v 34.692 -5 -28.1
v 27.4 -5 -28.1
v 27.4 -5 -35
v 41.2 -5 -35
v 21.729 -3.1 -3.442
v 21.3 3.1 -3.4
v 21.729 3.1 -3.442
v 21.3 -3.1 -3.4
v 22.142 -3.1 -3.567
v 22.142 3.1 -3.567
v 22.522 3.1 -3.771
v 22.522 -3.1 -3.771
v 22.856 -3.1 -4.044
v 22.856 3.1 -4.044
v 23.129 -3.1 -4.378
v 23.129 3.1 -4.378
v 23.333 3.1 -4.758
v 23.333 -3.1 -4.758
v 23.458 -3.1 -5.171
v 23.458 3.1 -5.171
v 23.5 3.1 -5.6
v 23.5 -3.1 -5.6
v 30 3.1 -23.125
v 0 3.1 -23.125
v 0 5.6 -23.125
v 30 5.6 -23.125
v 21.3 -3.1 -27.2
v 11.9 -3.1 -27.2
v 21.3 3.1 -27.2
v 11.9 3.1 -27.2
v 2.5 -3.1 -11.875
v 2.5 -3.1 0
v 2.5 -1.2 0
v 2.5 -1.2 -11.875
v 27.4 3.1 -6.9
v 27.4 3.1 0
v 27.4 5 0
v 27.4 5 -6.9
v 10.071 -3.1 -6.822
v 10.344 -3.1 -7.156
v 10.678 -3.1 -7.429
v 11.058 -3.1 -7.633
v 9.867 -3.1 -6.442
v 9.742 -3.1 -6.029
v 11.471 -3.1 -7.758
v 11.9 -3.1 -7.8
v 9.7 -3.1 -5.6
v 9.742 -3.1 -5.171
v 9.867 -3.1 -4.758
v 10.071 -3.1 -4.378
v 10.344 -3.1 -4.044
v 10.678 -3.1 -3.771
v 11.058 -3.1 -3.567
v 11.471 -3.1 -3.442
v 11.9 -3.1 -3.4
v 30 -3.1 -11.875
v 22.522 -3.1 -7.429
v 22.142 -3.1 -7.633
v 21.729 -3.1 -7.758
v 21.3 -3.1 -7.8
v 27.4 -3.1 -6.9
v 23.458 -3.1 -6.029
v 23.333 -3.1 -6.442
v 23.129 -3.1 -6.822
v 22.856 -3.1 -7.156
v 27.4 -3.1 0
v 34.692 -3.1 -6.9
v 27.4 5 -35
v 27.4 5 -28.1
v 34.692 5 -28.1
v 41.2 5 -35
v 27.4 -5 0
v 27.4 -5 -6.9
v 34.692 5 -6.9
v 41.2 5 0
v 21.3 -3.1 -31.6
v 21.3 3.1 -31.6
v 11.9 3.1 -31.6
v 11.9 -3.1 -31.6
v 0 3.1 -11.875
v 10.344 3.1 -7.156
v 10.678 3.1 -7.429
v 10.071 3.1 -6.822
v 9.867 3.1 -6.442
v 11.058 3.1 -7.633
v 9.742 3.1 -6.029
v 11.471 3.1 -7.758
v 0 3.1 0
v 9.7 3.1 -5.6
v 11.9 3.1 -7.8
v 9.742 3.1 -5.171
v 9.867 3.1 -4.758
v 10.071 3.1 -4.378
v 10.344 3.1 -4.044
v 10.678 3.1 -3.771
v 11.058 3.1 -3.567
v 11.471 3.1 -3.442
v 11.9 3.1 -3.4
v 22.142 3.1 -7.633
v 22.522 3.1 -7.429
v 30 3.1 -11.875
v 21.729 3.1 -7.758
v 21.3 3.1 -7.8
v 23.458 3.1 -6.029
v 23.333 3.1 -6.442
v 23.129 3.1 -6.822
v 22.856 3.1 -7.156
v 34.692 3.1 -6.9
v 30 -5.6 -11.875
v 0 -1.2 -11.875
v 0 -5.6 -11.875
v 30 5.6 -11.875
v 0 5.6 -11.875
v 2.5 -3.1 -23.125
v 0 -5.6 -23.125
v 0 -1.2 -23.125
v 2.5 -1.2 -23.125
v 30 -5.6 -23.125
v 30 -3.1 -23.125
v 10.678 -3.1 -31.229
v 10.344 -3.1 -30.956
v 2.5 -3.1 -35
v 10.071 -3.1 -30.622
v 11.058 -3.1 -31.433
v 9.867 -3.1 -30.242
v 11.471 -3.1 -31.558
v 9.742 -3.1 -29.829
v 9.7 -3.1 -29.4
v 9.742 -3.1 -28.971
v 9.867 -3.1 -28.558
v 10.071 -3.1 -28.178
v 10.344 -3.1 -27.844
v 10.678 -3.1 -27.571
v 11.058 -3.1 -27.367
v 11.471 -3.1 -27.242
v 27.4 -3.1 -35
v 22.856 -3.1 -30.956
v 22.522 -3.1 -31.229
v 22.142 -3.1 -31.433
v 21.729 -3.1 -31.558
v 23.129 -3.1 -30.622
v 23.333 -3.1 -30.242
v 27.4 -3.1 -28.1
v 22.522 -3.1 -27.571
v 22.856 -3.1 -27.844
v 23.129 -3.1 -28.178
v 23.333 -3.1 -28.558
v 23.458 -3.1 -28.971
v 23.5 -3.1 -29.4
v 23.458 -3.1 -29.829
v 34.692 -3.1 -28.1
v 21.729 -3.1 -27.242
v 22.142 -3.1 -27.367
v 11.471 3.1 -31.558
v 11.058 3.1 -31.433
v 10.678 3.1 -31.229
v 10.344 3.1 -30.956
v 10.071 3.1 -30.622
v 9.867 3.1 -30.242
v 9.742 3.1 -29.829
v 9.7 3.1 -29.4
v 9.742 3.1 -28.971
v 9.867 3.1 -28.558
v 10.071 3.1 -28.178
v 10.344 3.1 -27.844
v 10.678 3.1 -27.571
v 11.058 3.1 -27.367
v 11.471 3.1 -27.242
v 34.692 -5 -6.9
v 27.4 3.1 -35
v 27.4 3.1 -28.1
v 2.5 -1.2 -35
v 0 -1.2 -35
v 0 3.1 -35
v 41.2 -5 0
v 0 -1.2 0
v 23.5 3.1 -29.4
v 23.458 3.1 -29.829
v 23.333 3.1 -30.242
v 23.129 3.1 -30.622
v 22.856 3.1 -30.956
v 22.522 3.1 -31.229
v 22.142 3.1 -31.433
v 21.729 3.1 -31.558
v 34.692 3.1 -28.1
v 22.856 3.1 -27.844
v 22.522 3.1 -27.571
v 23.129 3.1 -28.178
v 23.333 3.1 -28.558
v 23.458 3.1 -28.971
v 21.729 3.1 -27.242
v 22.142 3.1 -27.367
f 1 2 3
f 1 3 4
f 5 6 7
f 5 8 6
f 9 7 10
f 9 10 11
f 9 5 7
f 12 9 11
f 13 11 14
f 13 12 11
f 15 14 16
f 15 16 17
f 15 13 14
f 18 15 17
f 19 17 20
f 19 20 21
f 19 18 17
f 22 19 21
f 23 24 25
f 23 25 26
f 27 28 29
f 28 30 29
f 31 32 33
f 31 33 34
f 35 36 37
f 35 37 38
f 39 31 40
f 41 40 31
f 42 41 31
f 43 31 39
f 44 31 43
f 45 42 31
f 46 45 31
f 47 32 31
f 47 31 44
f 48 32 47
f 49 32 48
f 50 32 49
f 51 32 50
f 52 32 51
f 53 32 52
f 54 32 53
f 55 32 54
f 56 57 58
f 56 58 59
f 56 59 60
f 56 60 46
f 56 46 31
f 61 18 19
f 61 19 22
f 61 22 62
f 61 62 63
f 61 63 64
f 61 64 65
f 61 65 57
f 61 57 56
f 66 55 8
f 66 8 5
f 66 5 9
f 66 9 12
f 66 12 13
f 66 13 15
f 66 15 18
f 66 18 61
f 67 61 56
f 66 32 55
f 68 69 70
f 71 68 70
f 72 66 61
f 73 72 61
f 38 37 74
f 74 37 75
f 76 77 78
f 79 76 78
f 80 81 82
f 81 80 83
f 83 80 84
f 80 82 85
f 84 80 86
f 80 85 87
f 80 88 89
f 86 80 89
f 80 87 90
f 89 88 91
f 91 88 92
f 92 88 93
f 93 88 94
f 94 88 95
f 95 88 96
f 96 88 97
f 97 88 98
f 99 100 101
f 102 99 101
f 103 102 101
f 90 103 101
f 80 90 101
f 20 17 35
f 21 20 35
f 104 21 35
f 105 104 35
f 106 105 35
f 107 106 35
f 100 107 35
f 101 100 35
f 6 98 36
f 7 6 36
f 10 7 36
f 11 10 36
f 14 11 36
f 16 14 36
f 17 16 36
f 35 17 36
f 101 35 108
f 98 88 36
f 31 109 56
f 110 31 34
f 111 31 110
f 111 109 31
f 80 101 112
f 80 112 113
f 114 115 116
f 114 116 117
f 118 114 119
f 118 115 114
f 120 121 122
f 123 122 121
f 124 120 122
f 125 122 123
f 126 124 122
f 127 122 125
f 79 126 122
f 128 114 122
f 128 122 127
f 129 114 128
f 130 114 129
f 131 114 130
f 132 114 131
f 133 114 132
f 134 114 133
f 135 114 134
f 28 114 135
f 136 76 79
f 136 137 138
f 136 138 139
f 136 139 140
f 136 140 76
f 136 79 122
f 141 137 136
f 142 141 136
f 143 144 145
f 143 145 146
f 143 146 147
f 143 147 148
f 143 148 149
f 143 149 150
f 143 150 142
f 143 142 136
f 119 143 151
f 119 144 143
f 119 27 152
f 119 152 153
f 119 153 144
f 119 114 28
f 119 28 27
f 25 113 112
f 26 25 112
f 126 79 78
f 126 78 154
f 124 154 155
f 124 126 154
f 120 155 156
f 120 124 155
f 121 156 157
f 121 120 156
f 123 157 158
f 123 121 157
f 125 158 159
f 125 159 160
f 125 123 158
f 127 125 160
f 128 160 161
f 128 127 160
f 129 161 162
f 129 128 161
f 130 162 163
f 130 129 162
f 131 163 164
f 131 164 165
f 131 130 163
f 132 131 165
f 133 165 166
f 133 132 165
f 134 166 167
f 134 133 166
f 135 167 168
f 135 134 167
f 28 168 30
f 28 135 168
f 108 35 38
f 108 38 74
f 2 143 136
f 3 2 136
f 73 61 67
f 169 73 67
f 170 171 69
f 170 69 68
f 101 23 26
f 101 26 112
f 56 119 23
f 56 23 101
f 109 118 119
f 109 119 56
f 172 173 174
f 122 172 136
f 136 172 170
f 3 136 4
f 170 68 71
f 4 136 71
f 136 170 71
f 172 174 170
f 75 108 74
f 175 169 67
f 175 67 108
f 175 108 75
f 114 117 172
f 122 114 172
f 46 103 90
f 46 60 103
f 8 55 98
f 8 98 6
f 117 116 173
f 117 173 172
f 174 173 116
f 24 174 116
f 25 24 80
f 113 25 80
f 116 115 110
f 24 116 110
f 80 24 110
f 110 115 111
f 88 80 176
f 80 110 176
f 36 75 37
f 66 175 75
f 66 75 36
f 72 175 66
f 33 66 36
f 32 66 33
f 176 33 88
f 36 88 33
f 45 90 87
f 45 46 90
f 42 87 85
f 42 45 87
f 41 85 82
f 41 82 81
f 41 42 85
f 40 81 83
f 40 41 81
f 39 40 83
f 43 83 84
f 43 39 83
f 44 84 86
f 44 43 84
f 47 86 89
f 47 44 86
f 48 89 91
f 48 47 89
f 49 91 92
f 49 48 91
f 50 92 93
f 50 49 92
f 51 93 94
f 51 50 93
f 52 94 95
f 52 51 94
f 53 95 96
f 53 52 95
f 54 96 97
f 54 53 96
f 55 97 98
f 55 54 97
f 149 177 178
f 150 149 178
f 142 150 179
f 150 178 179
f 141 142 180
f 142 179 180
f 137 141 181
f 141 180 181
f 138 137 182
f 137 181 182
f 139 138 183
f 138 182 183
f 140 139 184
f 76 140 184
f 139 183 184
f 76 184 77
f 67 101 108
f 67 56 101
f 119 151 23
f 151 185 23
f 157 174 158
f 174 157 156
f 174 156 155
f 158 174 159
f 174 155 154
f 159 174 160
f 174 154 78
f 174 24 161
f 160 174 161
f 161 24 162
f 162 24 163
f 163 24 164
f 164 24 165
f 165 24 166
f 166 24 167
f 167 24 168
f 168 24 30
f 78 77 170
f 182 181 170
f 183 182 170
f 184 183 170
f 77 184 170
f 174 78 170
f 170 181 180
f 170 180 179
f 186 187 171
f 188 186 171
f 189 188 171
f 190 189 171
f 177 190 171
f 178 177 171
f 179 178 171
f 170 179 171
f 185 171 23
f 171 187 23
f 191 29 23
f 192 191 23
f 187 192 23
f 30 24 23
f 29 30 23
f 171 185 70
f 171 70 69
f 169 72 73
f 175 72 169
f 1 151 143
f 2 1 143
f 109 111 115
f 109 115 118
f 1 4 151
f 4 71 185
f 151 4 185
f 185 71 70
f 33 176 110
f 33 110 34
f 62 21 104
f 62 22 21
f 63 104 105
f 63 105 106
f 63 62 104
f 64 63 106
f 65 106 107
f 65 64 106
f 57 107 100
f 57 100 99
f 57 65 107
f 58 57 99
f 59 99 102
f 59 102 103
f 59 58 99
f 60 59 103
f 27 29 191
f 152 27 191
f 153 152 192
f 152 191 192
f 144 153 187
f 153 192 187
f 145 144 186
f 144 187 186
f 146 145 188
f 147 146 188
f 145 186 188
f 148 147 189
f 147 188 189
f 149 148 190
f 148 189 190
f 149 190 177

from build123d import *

# Parameters (mm, degrees)
F1_DEPTH      = 5.6
F1_DEPTH_BACK = 5.6
F2_DEPTH      = 3.1
F2_DEPTH_BACK = 3.1
F0_W          = 2.5
F0_H          = 11.875
F3_DEPTH      = 1.2
F3_DEPTH_BACK = 3.1
F4_DEPTH      = 5
F4_DEPTH_BACK = 5


with BuildPart() as f1:
    # F0 (on Front) → F1 (new body, two sides)
    with BuildSketch(Plane.XZ) as f1_sk:
        Polygon((2.5, -11.875), (0, -11.875), (0, -23.125), (2.5, -23.125), (30, -23.125), (30, -11.875), align=None)
    extrude(amount=F1_DEPTH)
    extrude(f1_sk.sketch, amount=-F1_DEPTH_BACK)

    # F0 (on Front) → F2 (join, two sides)
    with BuildSketch(Plane.XZ) as f2_sk:
        Polygon((27.4, 0), (2.5, 0), (2.5, -11.875), (30, -11.875), (34.6922105263, -6.9), (27.4, -6.9), align=None)
        with BuildLine():
            ThreePointArc((9.7, -5.6), (10.3443650814, -4.0443650814), (11.9, -3.4))
            Line((11.9, -3.4), (21.3, -3.4))
            ThreePointArc((21.3, -3.4), (22.8556349186, -4.0443650814), (23.5, -5.6))
            ThreePointArc((23.5, -5.6), (22.8556349186, -7.1556349186), (21.3, -7.8))
            Line((21.3, -7.8), (11.9, -7.8))
            ThreePointArc((11.9, -7.8), (10.3443650814, -7.1556349186), (9.7, -5.6))
        make_face(mode=Mode.SUBTRACT)
        Polygon((30, -23.125), (2.5, -23.125), (2.5, -35), (27.4, -35), (27.4, -28.1), (34.6922105263, -28.1), align=None)
        with BuildLine():
            ThreePointArc((11.9, -31.6), (10.3443650814, -30.9556349186), (9.7, -29.4))
            ThreePointArc((9.7, -29.4), (10.3443650814, -27.8443650814), (11.9, -27.2))
            Line((11.9, -27.2), (21.3, -27.2))
            ThreePointArc((21.3, -27.2), (22.8556349186, -27.8443650814), (23.5, -29.4))
            ThreePointArc((23.5, -29.4), (22.8556349186, -30.9556349186), (21.3, -31.6))
            Line((21.3, -31.6), (11.9, -31.6))
        make_face(mode=Mode.SUBTRACT)
    extrude(amount=F2_DEPTH)
    extrude(f2_sk.sketch, amount=-F2_DEPTH_BACK)

    # F0 (on Front) → F3 (join, two sides)
    with BuildSketch(Plane.XZ) as f3_sk:
        with Locations((1.25, -5.9375)):
            Rectangle(F0_W, F0_H)
        with Locations((1.25, -29.0625)):
            Rectangle(F0_W, F0_H)
    extrude(amount=F3_DEPTH)
    extrude(f3_sk.sketch, amount=-F3_DEPTH_BACK)

    # F0 (on Front) → F4 (join, two sides)
    with BuildSketch(Plane.XZ) as f4_sk:
        Polygon((41.2, 0), (27.4, 0), (27.4, -6.9), (34.6922105263, -6.9), align=None)
        Polygon((41.2, -35), (34.6922105263, -28.1), (27.4, -28.1), (27.4, -35), align=None)
    extrude(amount=F4_DEPTH)
    extrude(f4_sk.sketch, amount=-F4_DEPTH_BACK)


solid = f1.part
